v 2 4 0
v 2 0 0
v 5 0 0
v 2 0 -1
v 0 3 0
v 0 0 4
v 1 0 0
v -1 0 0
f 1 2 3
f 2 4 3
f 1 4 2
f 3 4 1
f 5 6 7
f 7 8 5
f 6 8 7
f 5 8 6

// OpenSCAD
// fit the two pyramids together 
// back to back with the peak 
// in the z coord sticking out.
// The green object is the ground,
// the red objec is the brick.
// Then stack the blue object onto the red.

color( "LimeGreen", a=0.5 )
polyhedron(
points=[[2,0,0],[5,0,0],[2,4,0],[2,0,-1]], 
faces=[[0,1,2],[0,3,1],[0,2,3],[1,3,2]]);
	


//translate(v=[2,0,0])
//rotate( a=120, v=[-1, -1, -1])
color( "Red", a=0.5 ) 
polyhedron(
points=[[0,0,0],[0,3,0],[0,0,4],[1,0,0]], 
faces=[[0,1,2],[0,3,1],[0,2,3],[1,3,2]]);


// AFTER FIRST POINT : 3-3-coincident
//translate(v=[5.00, -3.00, 0.00])

// AFTER SECOND POINT : 0-3-coincident
// translate(v=[2.37,-0.923, 1.108])
// rotate( a=72, v=[-0.186, 0.062, -0.558] )

// FINAL : 0-1-coincident
//translate(v=[2.56, 0.426, 1.704])
//rotate( a=120, v=[-0.73,-0.42, -0.19] )

color( "Blue", a=0.5 ) 
polyhedron(
points=[[0,0,0],[0,3,0],[0,0,4],[-1,0,0]], 
faces=[[0,1,2],[0,3,1],[0,2,3],[1,3,2]]);
